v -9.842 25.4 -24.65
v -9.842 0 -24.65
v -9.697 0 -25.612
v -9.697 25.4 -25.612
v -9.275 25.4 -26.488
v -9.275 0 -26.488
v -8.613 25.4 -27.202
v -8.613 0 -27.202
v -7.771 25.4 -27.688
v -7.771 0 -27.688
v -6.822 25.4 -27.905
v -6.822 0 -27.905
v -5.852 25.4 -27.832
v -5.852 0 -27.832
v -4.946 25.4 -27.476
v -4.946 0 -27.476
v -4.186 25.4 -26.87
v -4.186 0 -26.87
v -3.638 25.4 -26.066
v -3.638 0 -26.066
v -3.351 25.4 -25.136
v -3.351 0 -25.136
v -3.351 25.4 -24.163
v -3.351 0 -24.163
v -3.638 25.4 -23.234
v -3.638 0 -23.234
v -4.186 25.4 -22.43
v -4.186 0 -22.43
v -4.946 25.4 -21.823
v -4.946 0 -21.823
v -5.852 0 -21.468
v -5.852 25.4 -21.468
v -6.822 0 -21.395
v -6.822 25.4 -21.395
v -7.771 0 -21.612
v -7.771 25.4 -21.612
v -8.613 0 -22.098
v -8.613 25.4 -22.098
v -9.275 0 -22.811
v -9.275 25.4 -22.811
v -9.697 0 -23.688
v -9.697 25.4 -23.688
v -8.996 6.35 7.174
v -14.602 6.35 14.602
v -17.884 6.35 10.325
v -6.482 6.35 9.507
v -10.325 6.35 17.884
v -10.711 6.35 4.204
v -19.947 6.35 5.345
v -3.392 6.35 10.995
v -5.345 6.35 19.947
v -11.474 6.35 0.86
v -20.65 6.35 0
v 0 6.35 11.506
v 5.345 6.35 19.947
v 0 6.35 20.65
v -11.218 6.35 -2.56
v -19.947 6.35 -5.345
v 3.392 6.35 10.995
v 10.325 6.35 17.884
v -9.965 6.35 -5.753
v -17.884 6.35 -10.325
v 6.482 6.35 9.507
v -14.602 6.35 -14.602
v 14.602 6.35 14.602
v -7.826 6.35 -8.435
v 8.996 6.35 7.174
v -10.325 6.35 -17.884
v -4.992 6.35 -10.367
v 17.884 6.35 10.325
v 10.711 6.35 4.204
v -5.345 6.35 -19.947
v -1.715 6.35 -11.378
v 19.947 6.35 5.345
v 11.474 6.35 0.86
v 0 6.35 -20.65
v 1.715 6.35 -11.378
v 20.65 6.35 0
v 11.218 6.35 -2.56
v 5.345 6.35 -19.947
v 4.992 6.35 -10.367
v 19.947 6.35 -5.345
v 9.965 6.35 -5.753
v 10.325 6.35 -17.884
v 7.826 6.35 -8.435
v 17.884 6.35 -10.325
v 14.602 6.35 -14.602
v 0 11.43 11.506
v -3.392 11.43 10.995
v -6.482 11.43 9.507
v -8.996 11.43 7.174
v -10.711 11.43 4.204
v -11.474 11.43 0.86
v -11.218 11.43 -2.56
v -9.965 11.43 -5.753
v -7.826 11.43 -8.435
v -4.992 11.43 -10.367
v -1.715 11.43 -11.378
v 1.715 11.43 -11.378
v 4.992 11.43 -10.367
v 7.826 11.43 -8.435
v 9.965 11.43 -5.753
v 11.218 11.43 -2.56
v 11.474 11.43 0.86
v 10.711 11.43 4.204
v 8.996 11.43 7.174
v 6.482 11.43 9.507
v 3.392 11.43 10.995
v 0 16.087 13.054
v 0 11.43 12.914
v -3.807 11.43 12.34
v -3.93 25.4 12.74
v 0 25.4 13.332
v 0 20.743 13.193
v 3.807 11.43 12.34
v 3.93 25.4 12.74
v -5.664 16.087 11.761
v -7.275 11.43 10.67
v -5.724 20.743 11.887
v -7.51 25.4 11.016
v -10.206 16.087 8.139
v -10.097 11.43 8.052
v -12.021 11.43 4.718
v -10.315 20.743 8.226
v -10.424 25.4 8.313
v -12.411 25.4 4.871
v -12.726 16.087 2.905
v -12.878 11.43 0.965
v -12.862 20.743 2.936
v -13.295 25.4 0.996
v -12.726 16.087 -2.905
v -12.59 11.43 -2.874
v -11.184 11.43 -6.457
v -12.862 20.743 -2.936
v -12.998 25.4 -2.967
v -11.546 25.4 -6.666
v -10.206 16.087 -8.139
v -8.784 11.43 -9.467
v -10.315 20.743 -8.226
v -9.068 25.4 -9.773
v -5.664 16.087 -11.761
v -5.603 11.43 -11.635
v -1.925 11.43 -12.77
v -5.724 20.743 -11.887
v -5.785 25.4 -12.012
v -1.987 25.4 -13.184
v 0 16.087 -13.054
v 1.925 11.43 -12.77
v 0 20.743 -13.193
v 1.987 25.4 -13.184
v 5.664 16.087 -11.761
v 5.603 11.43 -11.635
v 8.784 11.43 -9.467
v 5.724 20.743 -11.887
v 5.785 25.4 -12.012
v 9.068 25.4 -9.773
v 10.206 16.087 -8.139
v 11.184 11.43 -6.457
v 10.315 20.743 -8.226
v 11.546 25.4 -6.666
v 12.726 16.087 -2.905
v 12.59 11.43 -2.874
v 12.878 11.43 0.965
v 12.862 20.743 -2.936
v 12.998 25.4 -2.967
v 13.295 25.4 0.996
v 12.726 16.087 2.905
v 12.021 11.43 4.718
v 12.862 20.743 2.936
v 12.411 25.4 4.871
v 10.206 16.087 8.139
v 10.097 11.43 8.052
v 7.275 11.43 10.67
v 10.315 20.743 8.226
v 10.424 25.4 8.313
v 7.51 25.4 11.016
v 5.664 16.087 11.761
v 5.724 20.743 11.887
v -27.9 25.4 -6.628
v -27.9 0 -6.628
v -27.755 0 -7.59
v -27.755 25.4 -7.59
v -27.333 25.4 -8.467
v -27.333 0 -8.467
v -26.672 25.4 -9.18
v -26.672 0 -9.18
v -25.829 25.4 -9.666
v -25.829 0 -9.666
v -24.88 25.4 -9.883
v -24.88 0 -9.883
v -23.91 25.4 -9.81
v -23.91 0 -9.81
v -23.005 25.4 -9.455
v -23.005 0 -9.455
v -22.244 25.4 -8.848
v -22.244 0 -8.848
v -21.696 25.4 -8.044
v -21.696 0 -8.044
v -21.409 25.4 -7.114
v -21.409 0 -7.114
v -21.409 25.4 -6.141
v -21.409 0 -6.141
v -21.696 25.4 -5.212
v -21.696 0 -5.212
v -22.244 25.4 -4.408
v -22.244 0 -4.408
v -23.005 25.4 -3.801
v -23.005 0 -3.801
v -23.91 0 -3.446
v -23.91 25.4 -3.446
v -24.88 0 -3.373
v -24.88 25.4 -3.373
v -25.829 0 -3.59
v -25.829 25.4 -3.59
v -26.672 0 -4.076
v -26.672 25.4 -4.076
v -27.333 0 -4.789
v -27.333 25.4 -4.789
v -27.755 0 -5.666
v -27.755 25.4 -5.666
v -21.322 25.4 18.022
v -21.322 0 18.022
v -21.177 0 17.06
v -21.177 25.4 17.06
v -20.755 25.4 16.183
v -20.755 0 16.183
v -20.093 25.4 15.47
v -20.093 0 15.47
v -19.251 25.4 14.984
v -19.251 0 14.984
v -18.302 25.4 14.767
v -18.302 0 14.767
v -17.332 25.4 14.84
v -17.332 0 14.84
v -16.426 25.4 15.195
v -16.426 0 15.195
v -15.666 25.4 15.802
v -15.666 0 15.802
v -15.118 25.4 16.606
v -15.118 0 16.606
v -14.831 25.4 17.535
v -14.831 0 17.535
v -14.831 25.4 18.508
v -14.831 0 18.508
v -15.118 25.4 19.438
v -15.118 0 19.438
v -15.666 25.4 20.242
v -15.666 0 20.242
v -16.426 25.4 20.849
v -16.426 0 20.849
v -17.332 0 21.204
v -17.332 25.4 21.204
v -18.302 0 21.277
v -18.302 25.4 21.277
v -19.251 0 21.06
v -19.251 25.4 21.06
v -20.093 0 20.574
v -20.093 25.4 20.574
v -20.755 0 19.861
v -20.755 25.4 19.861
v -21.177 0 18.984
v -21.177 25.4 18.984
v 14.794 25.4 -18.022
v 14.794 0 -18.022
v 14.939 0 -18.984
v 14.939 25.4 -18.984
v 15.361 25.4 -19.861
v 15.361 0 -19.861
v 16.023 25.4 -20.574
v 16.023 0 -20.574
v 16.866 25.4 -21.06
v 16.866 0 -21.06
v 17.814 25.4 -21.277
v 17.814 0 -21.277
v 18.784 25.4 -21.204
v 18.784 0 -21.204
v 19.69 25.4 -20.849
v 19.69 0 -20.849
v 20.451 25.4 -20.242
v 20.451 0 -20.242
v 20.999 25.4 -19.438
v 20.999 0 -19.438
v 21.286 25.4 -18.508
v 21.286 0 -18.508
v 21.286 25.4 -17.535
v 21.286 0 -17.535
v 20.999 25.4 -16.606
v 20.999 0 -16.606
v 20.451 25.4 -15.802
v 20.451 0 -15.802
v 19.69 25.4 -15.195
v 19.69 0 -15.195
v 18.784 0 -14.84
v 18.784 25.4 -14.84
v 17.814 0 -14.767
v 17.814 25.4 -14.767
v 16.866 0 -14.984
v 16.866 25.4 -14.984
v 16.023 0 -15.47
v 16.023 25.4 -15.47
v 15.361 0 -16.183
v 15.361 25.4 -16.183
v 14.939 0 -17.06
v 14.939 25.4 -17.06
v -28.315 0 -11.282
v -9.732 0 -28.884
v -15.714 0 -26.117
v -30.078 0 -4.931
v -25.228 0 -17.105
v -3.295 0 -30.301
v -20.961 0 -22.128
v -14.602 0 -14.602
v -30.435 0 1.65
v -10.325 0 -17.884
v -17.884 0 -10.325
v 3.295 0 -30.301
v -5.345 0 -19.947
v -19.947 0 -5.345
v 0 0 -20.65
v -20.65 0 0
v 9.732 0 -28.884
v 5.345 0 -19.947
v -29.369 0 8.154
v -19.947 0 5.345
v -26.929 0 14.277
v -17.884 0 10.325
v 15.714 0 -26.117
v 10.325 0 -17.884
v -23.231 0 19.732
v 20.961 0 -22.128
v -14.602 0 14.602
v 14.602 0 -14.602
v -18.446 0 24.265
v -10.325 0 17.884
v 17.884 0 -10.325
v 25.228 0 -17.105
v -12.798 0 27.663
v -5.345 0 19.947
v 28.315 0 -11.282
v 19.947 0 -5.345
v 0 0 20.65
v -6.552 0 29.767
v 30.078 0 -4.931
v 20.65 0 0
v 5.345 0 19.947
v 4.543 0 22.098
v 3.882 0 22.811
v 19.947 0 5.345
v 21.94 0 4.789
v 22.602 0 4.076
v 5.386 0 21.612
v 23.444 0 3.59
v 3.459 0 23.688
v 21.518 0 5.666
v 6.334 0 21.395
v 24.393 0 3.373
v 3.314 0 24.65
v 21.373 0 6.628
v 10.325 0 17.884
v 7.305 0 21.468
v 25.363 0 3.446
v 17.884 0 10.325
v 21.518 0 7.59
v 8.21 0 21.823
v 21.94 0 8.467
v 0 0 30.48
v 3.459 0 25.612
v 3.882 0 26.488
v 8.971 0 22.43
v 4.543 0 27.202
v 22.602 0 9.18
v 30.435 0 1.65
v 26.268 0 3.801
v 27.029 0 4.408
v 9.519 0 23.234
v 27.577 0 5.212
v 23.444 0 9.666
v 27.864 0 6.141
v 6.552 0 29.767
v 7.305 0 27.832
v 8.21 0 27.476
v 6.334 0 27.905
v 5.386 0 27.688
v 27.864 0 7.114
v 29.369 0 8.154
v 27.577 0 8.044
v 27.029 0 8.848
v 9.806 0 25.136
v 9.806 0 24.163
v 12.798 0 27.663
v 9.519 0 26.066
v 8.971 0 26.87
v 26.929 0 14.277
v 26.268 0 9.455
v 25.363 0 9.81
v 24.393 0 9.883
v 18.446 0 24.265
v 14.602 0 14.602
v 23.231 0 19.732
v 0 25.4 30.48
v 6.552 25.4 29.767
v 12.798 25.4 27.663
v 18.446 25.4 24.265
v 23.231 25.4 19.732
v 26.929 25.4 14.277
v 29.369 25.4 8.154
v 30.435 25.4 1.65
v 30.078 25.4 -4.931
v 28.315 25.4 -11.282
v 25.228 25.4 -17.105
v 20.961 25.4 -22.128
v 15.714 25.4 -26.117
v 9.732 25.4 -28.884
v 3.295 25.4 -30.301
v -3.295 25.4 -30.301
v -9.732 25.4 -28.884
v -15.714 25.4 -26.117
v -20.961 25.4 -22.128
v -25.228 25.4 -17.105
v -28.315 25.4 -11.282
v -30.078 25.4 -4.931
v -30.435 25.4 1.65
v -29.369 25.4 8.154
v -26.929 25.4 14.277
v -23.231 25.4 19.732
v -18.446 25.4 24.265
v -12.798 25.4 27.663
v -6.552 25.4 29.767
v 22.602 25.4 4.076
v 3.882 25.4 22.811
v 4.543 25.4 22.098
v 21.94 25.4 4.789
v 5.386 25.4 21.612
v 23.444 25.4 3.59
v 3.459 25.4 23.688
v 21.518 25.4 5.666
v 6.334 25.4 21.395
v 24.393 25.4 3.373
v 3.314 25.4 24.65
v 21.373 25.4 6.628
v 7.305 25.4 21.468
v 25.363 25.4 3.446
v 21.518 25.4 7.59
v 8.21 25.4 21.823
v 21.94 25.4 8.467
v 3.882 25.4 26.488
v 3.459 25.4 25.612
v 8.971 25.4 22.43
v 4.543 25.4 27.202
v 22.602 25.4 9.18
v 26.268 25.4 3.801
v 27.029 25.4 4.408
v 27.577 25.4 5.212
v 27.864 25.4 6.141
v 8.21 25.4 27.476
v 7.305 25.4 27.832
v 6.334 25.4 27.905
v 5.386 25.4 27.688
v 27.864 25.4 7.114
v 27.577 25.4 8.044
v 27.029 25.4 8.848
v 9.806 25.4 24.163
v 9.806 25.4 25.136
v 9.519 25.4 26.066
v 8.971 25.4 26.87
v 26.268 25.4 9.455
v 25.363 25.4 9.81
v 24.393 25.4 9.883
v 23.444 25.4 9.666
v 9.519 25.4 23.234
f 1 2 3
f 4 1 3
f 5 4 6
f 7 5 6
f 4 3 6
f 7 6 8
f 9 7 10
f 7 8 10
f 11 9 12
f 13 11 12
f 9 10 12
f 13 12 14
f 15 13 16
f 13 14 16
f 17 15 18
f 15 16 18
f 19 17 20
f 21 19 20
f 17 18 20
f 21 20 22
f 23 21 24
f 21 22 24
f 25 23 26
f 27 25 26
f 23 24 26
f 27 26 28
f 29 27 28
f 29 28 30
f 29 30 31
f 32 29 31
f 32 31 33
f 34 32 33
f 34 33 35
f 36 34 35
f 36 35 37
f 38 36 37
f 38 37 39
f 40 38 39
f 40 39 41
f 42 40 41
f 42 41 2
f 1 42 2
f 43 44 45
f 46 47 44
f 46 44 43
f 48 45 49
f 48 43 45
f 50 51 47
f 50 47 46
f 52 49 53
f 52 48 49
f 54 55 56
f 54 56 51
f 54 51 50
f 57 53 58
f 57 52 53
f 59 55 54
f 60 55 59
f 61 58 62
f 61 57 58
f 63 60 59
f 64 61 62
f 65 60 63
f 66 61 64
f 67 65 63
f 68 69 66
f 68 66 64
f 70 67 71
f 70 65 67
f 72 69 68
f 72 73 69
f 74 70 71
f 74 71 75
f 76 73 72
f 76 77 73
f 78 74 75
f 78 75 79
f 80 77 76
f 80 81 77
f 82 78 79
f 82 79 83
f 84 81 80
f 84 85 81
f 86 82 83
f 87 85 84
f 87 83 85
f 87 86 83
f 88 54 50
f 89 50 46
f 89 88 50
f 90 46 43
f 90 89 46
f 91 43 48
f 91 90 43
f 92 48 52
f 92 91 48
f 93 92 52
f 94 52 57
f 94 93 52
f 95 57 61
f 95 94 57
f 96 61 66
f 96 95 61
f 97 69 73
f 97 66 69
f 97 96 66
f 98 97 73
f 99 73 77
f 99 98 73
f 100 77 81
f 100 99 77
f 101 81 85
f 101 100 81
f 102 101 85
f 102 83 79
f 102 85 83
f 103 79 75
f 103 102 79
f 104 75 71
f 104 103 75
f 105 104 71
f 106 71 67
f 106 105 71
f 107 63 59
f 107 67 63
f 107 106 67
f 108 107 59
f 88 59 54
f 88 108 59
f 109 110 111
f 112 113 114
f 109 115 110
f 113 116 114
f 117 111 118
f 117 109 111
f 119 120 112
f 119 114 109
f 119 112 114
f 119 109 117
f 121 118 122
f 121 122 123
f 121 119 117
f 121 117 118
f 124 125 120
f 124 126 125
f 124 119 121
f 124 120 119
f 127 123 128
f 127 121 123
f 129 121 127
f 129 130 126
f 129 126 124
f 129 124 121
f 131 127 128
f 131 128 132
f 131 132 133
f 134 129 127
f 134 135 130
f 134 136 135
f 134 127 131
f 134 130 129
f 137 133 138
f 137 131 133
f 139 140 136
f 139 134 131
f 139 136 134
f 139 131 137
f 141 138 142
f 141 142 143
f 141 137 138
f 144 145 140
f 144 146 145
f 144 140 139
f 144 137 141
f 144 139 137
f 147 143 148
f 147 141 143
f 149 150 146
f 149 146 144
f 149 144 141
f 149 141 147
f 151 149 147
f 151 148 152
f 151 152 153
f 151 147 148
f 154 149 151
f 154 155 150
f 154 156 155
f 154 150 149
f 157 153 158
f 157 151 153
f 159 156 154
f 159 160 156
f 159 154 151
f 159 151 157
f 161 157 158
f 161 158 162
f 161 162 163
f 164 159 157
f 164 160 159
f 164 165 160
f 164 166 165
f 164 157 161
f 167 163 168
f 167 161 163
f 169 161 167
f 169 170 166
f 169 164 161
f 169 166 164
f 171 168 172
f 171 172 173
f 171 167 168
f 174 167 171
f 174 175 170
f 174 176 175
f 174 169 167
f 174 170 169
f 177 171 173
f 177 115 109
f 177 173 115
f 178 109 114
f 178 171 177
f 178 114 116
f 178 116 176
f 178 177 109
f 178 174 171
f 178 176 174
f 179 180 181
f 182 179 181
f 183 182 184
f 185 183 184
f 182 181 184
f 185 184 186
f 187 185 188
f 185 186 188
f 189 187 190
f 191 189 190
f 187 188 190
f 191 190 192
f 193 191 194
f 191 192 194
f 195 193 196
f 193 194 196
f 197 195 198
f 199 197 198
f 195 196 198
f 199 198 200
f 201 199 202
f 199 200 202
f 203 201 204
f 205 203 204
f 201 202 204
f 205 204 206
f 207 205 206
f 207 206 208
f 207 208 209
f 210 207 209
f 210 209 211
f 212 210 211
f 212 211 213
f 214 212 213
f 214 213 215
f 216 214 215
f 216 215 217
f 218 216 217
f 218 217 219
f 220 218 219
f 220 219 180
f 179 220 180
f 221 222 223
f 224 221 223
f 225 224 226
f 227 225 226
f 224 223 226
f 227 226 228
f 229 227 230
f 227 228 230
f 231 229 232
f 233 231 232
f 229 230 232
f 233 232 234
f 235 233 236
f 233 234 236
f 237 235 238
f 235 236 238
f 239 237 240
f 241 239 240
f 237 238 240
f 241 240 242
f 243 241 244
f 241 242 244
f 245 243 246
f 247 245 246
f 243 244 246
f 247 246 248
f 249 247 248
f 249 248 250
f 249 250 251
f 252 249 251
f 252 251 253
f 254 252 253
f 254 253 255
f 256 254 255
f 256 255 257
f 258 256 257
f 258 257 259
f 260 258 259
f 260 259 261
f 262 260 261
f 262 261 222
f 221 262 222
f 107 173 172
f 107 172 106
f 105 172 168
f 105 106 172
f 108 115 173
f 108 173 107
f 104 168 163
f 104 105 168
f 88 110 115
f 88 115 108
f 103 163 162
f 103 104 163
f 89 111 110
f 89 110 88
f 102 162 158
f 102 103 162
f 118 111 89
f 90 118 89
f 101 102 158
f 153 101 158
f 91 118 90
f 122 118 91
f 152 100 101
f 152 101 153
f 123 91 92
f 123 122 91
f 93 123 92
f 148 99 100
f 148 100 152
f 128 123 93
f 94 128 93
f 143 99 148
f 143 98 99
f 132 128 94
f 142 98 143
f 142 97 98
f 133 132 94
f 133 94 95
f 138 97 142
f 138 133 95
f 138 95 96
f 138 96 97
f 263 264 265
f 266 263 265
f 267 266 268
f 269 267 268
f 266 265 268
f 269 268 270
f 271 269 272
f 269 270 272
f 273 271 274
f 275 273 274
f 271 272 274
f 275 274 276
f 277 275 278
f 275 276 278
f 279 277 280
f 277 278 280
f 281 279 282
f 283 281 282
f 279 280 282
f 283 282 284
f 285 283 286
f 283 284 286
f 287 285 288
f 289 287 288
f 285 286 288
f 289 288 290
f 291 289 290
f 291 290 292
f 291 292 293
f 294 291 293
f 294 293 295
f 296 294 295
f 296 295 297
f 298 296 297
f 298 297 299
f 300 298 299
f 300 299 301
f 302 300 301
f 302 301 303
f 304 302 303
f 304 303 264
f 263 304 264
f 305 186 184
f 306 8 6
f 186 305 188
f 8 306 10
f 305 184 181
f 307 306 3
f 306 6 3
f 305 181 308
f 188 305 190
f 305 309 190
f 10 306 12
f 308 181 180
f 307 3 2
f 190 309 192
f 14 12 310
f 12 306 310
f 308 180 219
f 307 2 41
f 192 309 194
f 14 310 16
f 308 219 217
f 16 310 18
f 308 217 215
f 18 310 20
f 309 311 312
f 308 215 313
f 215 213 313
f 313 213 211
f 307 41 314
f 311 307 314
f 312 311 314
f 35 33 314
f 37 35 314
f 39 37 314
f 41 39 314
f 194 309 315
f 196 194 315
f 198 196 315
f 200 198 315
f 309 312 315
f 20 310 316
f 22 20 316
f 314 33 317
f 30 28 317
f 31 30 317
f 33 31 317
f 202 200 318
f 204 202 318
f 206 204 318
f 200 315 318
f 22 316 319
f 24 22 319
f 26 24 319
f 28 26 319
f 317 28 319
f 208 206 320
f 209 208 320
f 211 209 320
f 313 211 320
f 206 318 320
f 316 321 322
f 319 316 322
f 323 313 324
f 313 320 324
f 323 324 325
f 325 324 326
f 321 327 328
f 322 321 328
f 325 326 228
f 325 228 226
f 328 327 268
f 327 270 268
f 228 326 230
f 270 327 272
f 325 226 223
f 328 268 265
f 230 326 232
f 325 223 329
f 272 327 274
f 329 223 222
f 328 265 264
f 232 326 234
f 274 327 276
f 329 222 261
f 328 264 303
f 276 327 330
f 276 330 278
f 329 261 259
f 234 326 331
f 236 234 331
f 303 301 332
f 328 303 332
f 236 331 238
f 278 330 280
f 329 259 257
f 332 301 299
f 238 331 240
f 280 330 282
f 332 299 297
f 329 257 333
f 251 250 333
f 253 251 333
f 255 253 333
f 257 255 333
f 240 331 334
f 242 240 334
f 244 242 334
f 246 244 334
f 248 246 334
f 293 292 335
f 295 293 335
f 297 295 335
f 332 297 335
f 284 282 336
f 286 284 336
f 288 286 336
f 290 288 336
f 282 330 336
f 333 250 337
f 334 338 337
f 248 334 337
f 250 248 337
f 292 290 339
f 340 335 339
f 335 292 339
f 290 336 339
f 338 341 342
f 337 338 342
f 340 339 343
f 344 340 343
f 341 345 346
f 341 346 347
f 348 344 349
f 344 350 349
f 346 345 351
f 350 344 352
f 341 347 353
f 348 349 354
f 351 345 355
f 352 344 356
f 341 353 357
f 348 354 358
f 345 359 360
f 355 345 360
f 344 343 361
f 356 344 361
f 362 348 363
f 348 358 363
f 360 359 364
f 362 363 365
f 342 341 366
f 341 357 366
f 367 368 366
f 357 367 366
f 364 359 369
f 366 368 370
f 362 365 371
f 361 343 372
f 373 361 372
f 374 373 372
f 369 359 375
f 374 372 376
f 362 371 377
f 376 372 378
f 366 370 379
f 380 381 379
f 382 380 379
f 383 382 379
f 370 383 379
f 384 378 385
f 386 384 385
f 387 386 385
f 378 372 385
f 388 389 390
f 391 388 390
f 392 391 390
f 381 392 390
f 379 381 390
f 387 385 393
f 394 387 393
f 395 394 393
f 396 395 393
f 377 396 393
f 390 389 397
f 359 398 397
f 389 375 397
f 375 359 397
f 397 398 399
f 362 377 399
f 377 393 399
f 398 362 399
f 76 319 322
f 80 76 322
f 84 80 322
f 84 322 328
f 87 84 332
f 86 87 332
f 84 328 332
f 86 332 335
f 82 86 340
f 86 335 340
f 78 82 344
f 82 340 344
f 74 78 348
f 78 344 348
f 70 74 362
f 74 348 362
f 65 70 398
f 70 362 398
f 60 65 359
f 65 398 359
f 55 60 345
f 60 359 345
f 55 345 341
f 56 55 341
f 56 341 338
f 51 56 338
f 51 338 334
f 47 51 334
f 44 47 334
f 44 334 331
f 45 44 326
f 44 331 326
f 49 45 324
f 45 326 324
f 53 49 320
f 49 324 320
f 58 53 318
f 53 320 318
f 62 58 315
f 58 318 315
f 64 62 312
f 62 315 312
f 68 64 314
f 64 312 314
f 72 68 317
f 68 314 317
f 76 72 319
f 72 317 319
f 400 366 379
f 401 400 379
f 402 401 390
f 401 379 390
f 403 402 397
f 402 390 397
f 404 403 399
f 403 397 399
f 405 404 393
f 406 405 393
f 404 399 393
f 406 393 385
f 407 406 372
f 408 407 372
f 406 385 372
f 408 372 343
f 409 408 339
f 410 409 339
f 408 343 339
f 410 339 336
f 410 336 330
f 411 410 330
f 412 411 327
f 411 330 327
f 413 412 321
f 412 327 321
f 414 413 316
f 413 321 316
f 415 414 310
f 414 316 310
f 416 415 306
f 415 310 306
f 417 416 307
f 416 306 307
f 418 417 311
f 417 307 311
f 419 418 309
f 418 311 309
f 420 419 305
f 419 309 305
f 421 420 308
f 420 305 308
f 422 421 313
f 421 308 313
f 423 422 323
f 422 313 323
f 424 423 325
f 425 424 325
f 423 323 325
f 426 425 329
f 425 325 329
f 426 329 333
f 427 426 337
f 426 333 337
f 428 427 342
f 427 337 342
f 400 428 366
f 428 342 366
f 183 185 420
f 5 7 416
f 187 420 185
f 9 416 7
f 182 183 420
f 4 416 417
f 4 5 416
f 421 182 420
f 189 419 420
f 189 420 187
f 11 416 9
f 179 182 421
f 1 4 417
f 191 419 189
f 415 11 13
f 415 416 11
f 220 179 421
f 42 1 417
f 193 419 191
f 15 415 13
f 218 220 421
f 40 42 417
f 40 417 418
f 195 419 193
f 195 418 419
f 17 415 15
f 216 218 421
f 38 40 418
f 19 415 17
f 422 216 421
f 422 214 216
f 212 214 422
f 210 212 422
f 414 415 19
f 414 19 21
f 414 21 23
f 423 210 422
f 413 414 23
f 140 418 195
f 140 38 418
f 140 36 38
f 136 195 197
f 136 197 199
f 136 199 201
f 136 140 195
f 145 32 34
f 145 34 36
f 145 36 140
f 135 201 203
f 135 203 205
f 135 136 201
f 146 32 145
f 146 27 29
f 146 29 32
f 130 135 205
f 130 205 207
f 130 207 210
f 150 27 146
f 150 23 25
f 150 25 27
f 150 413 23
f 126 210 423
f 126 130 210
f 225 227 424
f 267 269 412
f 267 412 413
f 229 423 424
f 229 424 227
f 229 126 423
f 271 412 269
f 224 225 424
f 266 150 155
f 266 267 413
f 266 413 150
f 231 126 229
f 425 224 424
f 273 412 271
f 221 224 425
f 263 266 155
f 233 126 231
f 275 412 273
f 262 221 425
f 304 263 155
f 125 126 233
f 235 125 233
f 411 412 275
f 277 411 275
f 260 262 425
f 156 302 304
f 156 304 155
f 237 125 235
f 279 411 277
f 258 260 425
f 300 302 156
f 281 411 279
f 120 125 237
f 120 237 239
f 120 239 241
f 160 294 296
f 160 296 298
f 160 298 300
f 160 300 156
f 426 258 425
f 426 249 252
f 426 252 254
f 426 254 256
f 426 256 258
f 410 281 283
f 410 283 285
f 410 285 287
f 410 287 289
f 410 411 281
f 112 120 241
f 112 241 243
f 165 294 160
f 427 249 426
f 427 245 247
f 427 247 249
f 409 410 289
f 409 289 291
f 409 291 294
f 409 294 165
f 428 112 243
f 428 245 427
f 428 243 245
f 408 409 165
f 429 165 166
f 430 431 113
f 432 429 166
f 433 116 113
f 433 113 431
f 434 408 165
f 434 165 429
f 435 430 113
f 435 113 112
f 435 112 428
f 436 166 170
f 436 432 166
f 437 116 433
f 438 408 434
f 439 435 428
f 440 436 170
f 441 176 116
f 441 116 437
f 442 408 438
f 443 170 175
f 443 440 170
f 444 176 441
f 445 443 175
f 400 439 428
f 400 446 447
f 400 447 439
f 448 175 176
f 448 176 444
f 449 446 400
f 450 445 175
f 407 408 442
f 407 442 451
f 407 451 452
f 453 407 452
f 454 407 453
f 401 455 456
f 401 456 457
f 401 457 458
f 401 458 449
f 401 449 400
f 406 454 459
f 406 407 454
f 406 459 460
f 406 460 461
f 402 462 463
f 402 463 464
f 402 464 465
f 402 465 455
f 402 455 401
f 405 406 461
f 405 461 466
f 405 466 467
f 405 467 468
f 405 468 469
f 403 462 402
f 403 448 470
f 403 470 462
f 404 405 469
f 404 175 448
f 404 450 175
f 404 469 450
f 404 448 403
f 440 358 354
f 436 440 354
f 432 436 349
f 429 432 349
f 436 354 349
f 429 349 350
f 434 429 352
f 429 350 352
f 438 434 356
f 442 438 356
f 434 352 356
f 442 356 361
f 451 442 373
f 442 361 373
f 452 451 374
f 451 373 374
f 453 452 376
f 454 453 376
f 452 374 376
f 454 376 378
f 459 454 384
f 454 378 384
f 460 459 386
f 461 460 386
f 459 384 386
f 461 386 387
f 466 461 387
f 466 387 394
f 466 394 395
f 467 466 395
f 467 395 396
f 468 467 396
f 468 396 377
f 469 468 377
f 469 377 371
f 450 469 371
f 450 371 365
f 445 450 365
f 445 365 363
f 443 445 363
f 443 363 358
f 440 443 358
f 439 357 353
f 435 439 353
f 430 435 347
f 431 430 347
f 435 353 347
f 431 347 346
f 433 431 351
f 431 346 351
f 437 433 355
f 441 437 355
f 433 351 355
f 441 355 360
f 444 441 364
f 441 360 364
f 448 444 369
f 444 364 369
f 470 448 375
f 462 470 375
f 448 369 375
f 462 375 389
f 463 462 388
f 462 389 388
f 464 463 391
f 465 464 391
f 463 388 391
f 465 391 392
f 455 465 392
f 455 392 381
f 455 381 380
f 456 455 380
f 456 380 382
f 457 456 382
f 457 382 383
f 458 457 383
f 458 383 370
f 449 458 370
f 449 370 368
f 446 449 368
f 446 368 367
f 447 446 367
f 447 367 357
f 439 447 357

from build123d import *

# Parameters (mm, degrees)
SKETCH1_R               = 30.48
BOSS_EXTRUDE1_DEPTH     = 25.4
SKETCH2_R               = 20.6502
CUT_EXTRUDE1_DEPTH      = 6.35
F_1_4_CLEARANCE_HOLE1_D = 6.5278


with BuildPart() as part:
    # Sketch1 → Boss-Extrude1 (new body)
    with BuildSketch(Plane(origin=(0, 0, 0), x_dir=(1, 0, 0), z_dir=(0, 1, 0))):
        with Locations(Location((0, 0, 0), (0, 0, 270))):
            Circle(SKETCH1_R)
    extrude(amount=BOSS_EXTRUDE1_DEPTH)

    # Sketch2 → Cut-Extrude1 (cut)
    with BuildSketch(Plane.XZ):
        with Locations(Location((0, 0, 0), (0, 0, 270))):
            Circle(SKETCH2_R)
    extrude(amount=-CUT_EXTRUDE1_DEPTH, mode=Mode.SUBTRACT)

    # Sketch4 → 3/4 NPT Tapped Hole1 (revolve, cut)
    with BuildSketch(Plane(origin=(0, 25.4, 0), x_dir=(0, 0, 1), z_dir=(1, 0, 0))):
        Polygon((0, 0), (0, 25.4), (11.5062, 25.4), (11.5062, 13.97), (12.914204892, 13.97), (13.3324854, 0), align=None)
    revolve(axis=Axis((0, 31.75, 0), (0, -1, 0)), mode=Mode.SUBTRACT)

    # 1/4 Clearance Hole1 (through all)
    with Locations(Plane(origin=(0, 25.4, 0), x_dir=(1, 0, 0), z_dir=(0, 1, 0))):
        with Locations((-24.636533331, 6.627886666), (-18.058184892, -18.021920393), (6.578348439, -24.649807059), (24.636533331, -6.627886666), (18.058184892, 18.021920393), (-6.578348439, 24.649807059)):
            Hole(F_1_4_CLEARANCE_HOLE1_D / 2)


solid = part.part
